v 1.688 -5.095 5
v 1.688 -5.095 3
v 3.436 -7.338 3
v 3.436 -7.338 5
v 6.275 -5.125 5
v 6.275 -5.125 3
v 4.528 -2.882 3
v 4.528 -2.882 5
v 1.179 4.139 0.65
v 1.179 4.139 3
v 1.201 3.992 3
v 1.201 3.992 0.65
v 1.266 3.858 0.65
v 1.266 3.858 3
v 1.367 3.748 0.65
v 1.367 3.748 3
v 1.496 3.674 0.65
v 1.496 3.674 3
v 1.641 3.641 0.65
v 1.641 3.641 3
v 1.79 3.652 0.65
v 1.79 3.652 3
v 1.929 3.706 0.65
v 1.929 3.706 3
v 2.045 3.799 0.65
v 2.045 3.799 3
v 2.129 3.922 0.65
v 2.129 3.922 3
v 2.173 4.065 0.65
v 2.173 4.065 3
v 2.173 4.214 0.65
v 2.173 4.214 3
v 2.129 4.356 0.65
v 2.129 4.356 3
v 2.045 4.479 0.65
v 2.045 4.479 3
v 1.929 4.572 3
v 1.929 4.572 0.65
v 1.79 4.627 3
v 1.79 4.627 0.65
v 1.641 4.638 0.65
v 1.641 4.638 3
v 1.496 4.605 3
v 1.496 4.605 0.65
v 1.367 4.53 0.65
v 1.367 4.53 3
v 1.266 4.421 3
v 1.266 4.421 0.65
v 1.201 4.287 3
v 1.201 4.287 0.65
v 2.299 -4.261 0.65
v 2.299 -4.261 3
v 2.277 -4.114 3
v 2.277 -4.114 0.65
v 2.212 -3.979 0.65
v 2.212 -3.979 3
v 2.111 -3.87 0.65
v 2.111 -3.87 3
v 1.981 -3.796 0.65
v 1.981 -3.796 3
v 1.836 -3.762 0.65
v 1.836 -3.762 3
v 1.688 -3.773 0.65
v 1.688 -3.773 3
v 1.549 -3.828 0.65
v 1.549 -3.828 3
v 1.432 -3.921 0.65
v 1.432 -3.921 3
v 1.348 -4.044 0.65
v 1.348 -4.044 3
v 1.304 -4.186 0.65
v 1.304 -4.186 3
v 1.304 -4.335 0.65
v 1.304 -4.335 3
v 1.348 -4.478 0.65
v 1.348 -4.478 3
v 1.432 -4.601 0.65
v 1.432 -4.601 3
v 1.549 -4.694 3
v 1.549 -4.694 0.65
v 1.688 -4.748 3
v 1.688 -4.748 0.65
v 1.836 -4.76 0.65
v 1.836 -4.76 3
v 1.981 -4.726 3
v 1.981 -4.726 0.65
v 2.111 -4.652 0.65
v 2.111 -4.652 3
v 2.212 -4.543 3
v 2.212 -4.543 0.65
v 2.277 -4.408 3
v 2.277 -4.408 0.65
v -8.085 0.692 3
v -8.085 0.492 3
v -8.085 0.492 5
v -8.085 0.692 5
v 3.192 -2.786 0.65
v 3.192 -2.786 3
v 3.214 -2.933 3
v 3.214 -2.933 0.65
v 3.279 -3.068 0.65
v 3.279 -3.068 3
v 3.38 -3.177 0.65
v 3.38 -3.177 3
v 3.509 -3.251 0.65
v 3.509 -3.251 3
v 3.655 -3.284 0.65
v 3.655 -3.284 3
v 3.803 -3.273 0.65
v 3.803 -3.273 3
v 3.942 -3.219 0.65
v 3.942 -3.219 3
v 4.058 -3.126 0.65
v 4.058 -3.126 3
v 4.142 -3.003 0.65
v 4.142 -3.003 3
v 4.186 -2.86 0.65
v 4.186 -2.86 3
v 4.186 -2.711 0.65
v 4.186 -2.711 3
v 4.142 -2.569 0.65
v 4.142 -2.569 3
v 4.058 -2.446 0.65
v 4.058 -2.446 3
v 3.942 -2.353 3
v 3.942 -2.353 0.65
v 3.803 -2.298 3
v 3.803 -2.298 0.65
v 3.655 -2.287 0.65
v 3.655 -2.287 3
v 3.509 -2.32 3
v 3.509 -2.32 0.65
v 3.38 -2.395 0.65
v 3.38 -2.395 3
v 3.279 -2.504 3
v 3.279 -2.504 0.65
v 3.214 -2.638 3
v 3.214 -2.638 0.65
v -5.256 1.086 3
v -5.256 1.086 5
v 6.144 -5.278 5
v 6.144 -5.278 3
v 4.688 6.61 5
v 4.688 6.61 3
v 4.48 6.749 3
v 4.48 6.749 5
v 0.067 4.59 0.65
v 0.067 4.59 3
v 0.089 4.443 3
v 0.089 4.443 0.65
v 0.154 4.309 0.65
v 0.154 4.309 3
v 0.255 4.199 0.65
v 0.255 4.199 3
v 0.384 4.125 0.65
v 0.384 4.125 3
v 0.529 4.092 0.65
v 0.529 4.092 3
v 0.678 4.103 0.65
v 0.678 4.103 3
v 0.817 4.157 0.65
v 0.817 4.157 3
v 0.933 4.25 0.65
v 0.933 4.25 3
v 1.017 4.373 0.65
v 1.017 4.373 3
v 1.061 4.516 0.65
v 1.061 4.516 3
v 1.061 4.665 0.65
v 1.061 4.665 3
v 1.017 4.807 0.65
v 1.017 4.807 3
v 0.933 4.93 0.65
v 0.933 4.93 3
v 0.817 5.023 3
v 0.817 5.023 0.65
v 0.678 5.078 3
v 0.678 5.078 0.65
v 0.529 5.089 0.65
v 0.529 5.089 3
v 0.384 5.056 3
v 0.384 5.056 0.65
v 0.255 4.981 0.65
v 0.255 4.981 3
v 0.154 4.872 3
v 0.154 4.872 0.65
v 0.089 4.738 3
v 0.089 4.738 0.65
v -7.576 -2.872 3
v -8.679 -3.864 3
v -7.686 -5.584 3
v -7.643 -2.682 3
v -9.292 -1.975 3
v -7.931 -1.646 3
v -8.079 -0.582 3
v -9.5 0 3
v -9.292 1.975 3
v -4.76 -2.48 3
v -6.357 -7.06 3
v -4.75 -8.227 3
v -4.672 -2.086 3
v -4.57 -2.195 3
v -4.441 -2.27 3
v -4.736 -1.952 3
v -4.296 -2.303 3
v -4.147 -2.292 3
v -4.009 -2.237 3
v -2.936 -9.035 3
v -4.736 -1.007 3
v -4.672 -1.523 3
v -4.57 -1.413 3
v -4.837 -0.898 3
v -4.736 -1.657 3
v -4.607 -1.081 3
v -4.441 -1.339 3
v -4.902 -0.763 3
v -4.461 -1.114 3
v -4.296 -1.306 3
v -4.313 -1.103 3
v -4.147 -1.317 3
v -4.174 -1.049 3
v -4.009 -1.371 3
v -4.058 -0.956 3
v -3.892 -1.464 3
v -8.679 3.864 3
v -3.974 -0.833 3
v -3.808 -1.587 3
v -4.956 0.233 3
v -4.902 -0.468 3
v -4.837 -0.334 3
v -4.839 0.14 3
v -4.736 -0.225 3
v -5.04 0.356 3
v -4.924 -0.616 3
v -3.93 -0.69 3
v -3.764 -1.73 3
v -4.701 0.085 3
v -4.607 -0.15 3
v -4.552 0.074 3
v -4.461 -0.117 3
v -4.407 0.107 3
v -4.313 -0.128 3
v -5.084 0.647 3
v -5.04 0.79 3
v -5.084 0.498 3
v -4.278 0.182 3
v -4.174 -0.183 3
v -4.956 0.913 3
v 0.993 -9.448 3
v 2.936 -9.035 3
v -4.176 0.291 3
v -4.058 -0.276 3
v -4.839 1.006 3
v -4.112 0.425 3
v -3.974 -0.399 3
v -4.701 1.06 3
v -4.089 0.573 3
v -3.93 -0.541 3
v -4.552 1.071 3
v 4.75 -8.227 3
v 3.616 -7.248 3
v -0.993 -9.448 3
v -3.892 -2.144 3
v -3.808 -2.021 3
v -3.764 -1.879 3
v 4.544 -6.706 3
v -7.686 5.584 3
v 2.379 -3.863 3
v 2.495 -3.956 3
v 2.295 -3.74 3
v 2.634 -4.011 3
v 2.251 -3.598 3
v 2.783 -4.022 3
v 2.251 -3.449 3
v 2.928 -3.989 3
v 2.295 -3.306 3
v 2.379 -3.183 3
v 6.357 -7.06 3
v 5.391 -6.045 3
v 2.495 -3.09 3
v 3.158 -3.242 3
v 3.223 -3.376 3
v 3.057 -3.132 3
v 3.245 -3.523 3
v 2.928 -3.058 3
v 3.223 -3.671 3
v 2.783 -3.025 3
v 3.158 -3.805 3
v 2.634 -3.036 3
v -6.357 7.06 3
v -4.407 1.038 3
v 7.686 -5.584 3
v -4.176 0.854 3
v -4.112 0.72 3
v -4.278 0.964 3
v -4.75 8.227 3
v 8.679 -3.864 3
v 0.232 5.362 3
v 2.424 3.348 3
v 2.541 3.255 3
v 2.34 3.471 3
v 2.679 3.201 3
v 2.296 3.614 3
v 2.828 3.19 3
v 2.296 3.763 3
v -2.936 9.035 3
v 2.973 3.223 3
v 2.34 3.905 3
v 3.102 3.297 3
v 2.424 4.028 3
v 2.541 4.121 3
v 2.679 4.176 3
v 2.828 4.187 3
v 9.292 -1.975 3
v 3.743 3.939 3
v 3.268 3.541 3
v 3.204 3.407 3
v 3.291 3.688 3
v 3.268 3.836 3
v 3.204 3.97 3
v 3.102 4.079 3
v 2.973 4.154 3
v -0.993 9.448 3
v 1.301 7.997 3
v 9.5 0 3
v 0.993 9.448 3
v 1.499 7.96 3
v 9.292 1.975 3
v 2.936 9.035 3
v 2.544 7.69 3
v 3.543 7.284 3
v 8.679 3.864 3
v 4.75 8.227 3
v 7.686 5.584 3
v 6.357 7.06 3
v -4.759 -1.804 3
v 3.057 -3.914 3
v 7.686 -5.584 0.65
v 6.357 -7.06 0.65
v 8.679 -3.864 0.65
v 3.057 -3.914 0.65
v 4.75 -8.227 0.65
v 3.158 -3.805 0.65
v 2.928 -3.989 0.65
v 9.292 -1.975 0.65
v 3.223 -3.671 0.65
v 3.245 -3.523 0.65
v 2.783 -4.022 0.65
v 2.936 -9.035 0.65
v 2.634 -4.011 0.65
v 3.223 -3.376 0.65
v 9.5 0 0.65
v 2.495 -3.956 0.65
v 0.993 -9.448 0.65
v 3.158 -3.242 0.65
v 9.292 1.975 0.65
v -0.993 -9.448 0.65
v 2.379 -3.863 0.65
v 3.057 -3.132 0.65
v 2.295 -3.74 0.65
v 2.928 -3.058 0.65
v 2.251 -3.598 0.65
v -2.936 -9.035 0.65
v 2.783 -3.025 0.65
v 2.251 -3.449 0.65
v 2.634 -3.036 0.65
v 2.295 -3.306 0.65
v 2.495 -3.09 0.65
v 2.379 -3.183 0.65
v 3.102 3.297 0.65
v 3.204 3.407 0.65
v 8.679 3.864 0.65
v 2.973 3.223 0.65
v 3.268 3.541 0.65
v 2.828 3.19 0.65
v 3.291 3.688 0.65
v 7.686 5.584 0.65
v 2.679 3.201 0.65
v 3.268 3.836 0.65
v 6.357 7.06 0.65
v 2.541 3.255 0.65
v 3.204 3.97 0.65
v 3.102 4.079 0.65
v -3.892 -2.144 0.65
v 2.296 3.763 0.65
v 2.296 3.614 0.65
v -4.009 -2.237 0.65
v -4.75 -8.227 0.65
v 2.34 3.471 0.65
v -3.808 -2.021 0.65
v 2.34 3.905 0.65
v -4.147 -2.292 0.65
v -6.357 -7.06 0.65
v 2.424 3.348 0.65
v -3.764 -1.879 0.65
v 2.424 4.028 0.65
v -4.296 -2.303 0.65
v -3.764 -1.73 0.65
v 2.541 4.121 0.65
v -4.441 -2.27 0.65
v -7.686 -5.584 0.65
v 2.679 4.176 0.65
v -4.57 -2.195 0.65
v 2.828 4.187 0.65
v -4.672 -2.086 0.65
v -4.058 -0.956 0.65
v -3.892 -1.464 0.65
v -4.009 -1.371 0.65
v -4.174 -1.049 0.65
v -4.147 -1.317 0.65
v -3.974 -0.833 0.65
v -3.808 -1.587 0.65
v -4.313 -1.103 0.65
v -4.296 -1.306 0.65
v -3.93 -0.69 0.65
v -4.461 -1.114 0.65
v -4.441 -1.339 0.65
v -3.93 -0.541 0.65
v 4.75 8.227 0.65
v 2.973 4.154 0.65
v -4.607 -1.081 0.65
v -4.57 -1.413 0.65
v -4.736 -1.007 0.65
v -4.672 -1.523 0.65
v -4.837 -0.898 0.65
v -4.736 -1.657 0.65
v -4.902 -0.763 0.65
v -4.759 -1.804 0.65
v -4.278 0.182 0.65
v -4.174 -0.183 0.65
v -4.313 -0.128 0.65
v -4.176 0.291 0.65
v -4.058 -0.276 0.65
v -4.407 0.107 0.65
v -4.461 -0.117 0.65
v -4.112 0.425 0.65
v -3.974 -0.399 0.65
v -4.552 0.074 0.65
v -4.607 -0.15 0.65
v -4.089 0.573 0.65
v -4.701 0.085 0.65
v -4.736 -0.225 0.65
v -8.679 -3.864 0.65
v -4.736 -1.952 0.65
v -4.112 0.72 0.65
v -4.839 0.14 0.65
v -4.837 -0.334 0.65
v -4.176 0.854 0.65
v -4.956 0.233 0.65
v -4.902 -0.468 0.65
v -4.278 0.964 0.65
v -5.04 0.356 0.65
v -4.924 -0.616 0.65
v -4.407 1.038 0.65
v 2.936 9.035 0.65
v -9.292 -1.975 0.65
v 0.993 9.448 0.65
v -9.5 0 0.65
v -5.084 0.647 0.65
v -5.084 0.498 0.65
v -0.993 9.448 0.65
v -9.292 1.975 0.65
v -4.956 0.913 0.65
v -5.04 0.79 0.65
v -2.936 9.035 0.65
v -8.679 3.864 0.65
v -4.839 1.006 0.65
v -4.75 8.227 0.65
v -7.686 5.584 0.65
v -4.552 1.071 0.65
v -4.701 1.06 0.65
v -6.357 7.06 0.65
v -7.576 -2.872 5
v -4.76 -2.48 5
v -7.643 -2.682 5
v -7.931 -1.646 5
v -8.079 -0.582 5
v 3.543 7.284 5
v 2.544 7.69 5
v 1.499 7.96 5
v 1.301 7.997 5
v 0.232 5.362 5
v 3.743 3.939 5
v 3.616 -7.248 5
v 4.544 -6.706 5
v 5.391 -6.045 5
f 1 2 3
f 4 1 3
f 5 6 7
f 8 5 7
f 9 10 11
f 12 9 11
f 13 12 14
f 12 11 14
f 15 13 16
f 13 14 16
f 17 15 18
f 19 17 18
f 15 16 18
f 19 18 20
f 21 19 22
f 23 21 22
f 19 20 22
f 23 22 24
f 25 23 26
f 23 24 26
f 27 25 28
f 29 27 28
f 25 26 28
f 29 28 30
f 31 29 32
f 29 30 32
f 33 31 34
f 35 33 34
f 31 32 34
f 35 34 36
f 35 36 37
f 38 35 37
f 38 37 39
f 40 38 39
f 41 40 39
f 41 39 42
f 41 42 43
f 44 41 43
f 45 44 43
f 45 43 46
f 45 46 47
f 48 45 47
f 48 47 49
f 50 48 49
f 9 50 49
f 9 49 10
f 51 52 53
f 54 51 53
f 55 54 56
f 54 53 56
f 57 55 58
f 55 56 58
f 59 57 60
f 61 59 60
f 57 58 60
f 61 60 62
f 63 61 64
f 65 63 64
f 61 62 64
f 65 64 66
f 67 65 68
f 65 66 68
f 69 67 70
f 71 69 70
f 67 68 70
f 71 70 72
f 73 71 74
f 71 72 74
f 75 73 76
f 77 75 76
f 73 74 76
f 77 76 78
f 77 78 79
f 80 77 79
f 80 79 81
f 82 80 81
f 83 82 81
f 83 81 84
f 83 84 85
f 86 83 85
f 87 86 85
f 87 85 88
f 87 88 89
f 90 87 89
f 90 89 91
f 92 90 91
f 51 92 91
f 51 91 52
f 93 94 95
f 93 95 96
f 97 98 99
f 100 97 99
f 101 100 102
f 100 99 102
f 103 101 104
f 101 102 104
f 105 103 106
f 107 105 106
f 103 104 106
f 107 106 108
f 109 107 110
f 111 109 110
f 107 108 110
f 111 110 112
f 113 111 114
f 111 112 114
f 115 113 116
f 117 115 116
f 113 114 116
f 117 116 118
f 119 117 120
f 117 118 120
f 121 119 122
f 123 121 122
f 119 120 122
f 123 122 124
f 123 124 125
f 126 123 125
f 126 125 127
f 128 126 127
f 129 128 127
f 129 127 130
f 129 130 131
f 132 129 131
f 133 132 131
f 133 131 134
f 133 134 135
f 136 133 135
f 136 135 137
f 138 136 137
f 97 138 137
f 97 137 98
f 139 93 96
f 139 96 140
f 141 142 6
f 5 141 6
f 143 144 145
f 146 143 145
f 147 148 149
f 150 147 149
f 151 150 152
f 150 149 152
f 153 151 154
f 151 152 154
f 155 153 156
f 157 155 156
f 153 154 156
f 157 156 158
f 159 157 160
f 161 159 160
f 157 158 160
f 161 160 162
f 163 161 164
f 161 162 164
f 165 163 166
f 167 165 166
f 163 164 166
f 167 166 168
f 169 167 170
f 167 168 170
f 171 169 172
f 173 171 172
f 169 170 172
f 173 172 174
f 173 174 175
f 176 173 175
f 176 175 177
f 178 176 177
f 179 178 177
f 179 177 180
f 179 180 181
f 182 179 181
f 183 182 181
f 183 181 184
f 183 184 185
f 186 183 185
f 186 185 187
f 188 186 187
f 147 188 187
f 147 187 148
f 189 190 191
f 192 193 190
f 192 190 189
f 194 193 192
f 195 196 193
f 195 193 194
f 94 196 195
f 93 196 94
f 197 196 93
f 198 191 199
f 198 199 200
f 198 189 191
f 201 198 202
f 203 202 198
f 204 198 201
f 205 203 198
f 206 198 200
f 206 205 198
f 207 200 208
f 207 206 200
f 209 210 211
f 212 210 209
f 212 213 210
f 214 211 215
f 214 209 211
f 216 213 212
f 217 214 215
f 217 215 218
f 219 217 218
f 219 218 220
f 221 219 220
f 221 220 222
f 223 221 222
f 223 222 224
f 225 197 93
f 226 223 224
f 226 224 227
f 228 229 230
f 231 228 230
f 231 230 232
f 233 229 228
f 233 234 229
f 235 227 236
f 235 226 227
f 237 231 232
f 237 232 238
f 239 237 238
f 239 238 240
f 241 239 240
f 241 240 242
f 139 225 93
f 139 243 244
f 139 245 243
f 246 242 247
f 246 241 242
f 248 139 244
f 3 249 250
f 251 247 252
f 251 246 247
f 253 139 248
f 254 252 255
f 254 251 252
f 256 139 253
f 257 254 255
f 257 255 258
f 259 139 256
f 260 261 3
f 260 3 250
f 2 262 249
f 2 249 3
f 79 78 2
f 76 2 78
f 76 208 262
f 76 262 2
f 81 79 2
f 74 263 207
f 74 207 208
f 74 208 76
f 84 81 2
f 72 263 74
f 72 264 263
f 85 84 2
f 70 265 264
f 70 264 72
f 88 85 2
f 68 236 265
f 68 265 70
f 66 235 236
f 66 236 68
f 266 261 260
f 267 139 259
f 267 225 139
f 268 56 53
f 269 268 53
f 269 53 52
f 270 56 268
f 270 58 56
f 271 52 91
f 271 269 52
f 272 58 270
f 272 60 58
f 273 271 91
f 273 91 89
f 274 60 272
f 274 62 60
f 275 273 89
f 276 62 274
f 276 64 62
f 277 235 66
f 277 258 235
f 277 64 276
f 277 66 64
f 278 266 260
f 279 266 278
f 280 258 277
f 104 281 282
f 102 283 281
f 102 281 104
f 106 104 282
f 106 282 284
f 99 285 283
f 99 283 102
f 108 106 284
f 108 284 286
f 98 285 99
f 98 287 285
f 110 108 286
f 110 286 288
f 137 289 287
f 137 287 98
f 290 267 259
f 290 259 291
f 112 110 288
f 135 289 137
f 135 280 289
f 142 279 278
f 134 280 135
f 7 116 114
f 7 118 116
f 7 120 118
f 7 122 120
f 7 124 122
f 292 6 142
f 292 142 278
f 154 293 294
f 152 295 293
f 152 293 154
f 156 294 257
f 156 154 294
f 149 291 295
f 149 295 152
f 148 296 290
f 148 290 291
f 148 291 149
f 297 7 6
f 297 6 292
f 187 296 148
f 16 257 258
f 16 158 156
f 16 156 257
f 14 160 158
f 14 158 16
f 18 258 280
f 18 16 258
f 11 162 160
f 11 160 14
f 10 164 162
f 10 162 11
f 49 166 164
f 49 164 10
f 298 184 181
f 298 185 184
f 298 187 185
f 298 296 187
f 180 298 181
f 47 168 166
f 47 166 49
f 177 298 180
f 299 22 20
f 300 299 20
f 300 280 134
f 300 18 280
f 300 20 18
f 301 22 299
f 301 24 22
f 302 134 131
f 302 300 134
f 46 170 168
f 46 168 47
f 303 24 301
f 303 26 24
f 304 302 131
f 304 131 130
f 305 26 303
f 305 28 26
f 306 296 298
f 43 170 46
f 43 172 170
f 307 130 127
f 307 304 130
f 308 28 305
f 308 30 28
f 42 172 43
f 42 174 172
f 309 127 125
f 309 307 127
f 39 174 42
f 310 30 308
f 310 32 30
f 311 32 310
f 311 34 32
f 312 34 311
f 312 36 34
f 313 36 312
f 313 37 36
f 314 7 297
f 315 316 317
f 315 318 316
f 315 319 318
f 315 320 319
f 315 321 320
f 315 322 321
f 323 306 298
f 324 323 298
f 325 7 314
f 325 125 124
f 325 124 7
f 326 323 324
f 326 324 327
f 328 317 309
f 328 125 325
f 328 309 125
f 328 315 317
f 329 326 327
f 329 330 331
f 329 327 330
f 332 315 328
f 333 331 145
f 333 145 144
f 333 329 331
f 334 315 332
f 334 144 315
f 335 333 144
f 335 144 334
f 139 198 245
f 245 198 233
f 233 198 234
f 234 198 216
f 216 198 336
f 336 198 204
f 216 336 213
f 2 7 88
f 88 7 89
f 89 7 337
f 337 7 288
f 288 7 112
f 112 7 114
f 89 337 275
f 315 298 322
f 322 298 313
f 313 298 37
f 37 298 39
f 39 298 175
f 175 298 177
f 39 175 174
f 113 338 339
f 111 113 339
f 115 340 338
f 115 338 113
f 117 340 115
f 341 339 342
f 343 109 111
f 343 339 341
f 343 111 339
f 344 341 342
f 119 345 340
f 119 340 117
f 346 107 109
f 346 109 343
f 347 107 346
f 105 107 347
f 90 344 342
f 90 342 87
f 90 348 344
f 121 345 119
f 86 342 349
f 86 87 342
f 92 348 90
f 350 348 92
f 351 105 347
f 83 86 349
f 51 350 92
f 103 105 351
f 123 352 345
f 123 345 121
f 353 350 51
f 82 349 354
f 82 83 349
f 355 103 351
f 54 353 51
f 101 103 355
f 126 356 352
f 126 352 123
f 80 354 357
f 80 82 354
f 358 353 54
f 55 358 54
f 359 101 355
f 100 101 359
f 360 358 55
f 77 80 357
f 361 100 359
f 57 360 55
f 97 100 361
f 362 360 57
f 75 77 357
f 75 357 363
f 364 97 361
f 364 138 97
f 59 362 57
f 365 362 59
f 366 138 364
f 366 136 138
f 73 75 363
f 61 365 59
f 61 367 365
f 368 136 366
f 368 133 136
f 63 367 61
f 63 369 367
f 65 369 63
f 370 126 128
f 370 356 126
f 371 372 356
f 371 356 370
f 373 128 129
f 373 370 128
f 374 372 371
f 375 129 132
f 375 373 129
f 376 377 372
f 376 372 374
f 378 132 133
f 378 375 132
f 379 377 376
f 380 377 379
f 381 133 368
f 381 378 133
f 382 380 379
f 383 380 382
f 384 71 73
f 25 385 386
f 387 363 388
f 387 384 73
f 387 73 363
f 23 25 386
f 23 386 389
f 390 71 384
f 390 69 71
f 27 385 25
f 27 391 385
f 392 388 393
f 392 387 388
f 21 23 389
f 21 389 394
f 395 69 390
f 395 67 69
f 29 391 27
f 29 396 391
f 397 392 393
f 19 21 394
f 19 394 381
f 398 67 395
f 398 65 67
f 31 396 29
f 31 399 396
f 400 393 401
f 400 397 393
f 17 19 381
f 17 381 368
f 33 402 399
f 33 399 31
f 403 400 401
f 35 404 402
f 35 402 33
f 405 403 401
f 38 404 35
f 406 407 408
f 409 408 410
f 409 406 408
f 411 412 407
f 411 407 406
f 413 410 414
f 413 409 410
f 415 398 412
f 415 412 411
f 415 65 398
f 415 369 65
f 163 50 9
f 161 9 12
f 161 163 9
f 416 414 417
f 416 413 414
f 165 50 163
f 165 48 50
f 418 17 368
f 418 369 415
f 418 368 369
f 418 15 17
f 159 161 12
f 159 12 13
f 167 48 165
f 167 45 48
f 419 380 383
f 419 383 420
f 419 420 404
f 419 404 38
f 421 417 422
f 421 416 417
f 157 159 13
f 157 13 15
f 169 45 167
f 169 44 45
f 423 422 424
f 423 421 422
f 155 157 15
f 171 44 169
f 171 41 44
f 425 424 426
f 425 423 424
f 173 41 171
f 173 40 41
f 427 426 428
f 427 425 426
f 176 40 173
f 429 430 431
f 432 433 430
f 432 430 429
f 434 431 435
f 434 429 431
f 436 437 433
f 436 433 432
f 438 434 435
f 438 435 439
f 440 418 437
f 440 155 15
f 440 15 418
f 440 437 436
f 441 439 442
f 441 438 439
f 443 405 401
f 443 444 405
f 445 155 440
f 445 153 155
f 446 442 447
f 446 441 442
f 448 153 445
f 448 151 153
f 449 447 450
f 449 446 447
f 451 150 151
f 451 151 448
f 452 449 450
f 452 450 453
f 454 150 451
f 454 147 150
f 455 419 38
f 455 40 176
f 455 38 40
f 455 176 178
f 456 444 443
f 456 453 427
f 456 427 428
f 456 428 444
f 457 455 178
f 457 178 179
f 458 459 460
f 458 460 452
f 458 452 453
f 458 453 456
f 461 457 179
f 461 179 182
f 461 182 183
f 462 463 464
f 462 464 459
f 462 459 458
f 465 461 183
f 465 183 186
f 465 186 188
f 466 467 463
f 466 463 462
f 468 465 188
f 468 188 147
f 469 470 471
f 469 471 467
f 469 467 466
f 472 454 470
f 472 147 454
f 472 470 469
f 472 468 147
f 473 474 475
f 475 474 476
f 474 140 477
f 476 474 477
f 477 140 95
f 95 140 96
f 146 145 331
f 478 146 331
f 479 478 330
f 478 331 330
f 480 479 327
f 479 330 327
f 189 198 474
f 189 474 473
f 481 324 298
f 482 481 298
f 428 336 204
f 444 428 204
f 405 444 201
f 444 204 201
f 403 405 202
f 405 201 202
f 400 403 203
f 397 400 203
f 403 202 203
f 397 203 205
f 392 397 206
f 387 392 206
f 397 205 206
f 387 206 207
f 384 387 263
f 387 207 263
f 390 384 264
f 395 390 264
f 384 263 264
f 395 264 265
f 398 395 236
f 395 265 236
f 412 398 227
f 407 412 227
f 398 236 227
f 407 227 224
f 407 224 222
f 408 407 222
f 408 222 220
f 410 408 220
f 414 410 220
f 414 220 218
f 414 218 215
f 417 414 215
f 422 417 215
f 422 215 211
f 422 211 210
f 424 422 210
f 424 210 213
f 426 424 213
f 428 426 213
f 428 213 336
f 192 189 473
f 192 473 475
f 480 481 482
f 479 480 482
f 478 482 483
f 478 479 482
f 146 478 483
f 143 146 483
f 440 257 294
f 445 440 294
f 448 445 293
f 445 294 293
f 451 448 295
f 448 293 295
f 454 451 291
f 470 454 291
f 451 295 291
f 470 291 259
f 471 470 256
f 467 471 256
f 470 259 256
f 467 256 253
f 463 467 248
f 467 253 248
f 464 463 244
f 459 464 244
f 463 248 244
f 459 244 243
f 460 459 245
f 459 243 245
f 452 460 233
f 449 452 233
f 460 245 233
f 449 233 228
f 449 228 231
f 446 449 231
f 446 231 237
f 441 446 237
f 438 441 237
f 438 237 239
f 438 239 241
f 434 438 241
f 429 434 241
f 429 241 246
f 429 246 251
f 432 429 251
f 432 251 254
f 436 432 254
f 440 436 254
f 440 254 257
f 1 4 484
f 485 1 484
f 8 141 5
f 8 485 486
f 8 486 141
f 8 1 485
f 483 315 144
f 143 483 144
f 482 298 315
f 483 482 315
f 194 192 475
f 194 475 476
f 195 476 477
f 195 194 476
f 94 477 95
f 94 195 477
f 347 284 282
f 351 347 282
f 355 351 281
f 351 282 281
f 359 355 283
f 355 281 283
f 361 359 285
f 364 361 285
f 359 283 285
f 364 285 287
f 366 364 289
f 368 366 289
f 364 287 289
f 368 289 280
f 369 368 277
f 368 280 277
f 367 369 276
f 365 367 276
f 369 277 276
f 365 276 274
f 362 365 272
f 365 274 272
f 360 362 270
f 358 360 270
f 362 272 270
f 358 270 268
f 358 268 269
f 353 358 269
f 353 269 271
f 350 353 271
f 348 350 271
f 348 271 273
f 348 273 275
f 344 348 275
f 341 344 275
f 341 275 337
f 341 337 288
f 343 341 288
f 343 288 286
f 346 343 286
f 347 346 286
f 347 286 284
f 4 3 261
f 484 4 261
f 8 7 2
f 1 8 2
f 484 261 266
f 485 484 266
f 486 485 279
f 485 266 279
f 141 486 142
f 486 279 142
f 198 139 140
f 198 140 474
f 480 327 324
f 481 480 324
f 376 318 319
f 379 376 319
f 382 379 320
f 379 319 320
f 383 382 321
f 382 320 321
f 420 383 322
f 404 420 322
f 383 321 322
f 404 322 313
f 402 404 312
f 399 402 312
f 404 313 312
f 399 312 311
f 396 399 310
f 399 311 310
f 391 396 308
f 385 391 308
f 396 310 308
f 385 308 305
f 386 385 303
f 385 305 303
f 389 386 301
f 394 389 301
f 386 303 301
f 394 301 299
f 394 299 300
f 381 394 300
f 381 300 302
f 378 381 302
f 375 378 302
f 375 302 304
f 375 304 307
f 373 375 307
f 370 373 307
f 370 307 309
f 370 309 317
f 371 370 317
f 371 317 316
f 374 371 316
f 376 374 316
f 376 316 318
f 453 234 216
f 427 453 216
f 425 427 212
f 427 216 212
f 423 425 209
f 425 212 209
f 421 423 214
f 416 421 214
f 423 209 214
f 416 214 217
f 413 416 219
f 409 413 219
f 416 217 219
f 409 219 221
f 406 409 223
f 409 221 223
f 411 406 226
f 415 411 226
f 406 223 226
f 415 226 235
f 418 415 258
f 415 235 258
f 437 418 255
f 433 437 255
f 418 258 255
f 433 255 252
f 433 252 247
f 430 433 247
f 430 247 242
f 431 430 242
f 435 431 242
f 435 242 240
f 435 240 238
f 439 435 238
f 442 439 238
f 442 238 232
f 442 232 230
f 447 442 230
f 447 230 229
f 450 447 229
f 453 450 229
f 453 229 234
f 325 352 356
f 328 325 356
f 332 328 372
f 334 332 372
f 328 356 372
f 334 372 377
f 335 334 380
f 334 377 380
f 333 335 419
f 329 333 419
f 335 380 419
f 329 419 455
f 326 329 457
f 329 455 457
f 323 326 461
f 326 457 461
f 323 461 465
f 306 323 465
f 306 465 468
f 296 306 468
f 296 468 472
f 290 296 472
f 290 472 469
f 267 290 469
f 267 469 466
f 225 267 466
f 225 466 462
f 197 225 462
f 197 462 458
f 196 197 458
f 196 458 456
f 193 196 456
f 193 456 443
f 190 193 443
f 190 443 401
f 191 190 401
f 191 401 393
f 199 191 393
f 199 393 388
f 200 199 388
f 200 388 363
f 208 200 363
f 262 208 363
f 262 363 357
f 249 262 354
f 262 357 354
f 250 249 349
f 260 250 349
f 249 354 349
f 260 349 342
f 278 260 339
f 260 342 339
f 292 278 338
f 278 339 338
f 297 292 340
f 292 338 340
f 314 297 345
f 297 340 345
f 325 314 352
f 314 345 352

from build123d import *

# Parameters (mm, degrees)
SKETCH2_R           = 9.5
SKETCH2_R_2         = 5.15
BOSS_EXTRUDE1_DEPTH = 3
BOSS_EXTRUDE2_DEPTH = 2
SKETCH4_R           = 5.15
BOSS_EXTRUDE3_DEPTH = 3
SKETCH5_R           = 0.5
CUT_EXTRUDE1_DEPTH  = 14.765899898
SKETCH6_R           = 9.5
CUT_EXTRUDE2_DEPTH  = 0.65


with BuildPart() as part:
    # Sketch2 → Boss-Extrude1 (new body)
    with BuildSketch(Plane.XY):
        Circle(SKETCH2_R)
        Circle(SKETCH2_R_2, mode=Mode.SUBTRACT)
    extrude(amount=BOSS_EXTRUDE1_DEPTH)

    # Sketch3 → Boss-Extrude2 (add)
    with BuildSketch(Plane.XY.offset(3)):
        with BuildLine():
            Line((6.143973875, -5.278407433), (6.275470836, -5.125347271))
            Line((6.275470836, -5.125347271), (4.527710902, -2.882271968))
            Line((4.527710902, -2.882271968), (1.687974032, -5.0949388))
            Line((1.687974032, -5.0949388), (3.435733966, -7.338014103))
            Line((3.435733966, -7.338014103), (3.616296002, -7.247924063))
            ThreePointArc((3.616296002, -7.247924063), (4.978500372, -6.389407957), (6.143973875, -5.278407433))
        make_face()
        with BuildLine():
            Line((-8.085034364, 0.691867379), (-5.256333448, 1.085641007))
            Line((-5.256333448, 1.085641007), (-4.759976196, -2.479976678))
            Line((-4.759976196, -2.479976678), (-7.576416358, -2.872043529))
            Line((-7.576416358, -2.872043529), (-7.643221866, -2.68163374))
            ThreePointArc((-7.643221866, -2.68163374), (-8.022639792, -1.116803816), (-8.085034364, 0.492157827))
            Line((-8.085034364, 0.492157827), (-8.085034364, 0.691867379))
        make_face()
        with BuildLine():
            Line((3.742806644, 3.938550831), (4.68847999, 6.609921942))
            Line((4.68847999, 6.609921942), (4.479502253, 6.748633904))
            ThreePointArc((4.479502253, 6.748633904), (3.050121393, 7.503783012), (1.499247991, 7.960041172))
            Line((1.499247991, 7.960041172), (1.300945522, 7.9973908))
            Line((1.300945522, 7.9973908), (0.232265294, 5.362248647))
            Line((0.232265294, 5.362248647), (3.742806644, 3.938550831))
        make_face()
    extrude(amount=BOSS_EXTRUDE2_DEPTH)

    # Sketch4 → Boss-Extrude3 (add)
    with BuildSketch(Plane(origin=(0, 0, 0), x_dir=(-1, 0, 0), z_dir=(0, 0, -1))):
        Circle(SKETCH4_R)
    extrude(amount=-BOSS_EXTRUDE3_DEPTH)

    # Sketch5 → Cut-Extrude1 (cut, through all)
    with BuildSketch(Plane.XY.offset(3)):
        with Locations((2.745365917, -3.523402937)):
            Circle(SKETCH5_R)
        with Locations((1.79878696, -4.260958548)):
            Circle(SKETCH5_R)
        with Locations(Location((3.691944873, -2.785847327, 0), (0, 0, 180))):
            Circle(SKETCH5_R)
        with Locations(Location((0.566642119, 4.590241713, 0), (0, 0, 180))):
            Circle(SKETCH5_R)
        with Locations(Location((1.678673493, 4.139258095, 0), (0, 0, 180))):
            Circle(SKETCH5_R)
        with Locations((2.790704867, 3.688274478)):
            Circle(SKETCH5_R)
        with Locations(Location((-4.258586993, -1.804394387, 0), (0, 0, 180))):
            Circle(SKETCH5_R)
        with Locations(Location((-4.42403941, -0.615855158, 0), (0, 0, 180))):
            Circle(SKETCH5_R)
        with Locations((-4.589491827, 0.57268407)):
            Circle(SKETCH5_R)
    extrude(amount=-CUT_EXTRUDE1_DEPTH, mode=Mode.SUBTRACT)

    # Sketch6 → Cut-Extrude2 (cut)
    with BuildSketch(Plane(origin=(0, 0, 0), x_dir=(-1, 0, 0), z_dir=(0, 0, -1))):
        Circle(SKETCH6_R)
    extrude(amount=-CUT_EXTRUDE2_DEPTH, mode=Mode.SUBTRACT)


solid = part.part
